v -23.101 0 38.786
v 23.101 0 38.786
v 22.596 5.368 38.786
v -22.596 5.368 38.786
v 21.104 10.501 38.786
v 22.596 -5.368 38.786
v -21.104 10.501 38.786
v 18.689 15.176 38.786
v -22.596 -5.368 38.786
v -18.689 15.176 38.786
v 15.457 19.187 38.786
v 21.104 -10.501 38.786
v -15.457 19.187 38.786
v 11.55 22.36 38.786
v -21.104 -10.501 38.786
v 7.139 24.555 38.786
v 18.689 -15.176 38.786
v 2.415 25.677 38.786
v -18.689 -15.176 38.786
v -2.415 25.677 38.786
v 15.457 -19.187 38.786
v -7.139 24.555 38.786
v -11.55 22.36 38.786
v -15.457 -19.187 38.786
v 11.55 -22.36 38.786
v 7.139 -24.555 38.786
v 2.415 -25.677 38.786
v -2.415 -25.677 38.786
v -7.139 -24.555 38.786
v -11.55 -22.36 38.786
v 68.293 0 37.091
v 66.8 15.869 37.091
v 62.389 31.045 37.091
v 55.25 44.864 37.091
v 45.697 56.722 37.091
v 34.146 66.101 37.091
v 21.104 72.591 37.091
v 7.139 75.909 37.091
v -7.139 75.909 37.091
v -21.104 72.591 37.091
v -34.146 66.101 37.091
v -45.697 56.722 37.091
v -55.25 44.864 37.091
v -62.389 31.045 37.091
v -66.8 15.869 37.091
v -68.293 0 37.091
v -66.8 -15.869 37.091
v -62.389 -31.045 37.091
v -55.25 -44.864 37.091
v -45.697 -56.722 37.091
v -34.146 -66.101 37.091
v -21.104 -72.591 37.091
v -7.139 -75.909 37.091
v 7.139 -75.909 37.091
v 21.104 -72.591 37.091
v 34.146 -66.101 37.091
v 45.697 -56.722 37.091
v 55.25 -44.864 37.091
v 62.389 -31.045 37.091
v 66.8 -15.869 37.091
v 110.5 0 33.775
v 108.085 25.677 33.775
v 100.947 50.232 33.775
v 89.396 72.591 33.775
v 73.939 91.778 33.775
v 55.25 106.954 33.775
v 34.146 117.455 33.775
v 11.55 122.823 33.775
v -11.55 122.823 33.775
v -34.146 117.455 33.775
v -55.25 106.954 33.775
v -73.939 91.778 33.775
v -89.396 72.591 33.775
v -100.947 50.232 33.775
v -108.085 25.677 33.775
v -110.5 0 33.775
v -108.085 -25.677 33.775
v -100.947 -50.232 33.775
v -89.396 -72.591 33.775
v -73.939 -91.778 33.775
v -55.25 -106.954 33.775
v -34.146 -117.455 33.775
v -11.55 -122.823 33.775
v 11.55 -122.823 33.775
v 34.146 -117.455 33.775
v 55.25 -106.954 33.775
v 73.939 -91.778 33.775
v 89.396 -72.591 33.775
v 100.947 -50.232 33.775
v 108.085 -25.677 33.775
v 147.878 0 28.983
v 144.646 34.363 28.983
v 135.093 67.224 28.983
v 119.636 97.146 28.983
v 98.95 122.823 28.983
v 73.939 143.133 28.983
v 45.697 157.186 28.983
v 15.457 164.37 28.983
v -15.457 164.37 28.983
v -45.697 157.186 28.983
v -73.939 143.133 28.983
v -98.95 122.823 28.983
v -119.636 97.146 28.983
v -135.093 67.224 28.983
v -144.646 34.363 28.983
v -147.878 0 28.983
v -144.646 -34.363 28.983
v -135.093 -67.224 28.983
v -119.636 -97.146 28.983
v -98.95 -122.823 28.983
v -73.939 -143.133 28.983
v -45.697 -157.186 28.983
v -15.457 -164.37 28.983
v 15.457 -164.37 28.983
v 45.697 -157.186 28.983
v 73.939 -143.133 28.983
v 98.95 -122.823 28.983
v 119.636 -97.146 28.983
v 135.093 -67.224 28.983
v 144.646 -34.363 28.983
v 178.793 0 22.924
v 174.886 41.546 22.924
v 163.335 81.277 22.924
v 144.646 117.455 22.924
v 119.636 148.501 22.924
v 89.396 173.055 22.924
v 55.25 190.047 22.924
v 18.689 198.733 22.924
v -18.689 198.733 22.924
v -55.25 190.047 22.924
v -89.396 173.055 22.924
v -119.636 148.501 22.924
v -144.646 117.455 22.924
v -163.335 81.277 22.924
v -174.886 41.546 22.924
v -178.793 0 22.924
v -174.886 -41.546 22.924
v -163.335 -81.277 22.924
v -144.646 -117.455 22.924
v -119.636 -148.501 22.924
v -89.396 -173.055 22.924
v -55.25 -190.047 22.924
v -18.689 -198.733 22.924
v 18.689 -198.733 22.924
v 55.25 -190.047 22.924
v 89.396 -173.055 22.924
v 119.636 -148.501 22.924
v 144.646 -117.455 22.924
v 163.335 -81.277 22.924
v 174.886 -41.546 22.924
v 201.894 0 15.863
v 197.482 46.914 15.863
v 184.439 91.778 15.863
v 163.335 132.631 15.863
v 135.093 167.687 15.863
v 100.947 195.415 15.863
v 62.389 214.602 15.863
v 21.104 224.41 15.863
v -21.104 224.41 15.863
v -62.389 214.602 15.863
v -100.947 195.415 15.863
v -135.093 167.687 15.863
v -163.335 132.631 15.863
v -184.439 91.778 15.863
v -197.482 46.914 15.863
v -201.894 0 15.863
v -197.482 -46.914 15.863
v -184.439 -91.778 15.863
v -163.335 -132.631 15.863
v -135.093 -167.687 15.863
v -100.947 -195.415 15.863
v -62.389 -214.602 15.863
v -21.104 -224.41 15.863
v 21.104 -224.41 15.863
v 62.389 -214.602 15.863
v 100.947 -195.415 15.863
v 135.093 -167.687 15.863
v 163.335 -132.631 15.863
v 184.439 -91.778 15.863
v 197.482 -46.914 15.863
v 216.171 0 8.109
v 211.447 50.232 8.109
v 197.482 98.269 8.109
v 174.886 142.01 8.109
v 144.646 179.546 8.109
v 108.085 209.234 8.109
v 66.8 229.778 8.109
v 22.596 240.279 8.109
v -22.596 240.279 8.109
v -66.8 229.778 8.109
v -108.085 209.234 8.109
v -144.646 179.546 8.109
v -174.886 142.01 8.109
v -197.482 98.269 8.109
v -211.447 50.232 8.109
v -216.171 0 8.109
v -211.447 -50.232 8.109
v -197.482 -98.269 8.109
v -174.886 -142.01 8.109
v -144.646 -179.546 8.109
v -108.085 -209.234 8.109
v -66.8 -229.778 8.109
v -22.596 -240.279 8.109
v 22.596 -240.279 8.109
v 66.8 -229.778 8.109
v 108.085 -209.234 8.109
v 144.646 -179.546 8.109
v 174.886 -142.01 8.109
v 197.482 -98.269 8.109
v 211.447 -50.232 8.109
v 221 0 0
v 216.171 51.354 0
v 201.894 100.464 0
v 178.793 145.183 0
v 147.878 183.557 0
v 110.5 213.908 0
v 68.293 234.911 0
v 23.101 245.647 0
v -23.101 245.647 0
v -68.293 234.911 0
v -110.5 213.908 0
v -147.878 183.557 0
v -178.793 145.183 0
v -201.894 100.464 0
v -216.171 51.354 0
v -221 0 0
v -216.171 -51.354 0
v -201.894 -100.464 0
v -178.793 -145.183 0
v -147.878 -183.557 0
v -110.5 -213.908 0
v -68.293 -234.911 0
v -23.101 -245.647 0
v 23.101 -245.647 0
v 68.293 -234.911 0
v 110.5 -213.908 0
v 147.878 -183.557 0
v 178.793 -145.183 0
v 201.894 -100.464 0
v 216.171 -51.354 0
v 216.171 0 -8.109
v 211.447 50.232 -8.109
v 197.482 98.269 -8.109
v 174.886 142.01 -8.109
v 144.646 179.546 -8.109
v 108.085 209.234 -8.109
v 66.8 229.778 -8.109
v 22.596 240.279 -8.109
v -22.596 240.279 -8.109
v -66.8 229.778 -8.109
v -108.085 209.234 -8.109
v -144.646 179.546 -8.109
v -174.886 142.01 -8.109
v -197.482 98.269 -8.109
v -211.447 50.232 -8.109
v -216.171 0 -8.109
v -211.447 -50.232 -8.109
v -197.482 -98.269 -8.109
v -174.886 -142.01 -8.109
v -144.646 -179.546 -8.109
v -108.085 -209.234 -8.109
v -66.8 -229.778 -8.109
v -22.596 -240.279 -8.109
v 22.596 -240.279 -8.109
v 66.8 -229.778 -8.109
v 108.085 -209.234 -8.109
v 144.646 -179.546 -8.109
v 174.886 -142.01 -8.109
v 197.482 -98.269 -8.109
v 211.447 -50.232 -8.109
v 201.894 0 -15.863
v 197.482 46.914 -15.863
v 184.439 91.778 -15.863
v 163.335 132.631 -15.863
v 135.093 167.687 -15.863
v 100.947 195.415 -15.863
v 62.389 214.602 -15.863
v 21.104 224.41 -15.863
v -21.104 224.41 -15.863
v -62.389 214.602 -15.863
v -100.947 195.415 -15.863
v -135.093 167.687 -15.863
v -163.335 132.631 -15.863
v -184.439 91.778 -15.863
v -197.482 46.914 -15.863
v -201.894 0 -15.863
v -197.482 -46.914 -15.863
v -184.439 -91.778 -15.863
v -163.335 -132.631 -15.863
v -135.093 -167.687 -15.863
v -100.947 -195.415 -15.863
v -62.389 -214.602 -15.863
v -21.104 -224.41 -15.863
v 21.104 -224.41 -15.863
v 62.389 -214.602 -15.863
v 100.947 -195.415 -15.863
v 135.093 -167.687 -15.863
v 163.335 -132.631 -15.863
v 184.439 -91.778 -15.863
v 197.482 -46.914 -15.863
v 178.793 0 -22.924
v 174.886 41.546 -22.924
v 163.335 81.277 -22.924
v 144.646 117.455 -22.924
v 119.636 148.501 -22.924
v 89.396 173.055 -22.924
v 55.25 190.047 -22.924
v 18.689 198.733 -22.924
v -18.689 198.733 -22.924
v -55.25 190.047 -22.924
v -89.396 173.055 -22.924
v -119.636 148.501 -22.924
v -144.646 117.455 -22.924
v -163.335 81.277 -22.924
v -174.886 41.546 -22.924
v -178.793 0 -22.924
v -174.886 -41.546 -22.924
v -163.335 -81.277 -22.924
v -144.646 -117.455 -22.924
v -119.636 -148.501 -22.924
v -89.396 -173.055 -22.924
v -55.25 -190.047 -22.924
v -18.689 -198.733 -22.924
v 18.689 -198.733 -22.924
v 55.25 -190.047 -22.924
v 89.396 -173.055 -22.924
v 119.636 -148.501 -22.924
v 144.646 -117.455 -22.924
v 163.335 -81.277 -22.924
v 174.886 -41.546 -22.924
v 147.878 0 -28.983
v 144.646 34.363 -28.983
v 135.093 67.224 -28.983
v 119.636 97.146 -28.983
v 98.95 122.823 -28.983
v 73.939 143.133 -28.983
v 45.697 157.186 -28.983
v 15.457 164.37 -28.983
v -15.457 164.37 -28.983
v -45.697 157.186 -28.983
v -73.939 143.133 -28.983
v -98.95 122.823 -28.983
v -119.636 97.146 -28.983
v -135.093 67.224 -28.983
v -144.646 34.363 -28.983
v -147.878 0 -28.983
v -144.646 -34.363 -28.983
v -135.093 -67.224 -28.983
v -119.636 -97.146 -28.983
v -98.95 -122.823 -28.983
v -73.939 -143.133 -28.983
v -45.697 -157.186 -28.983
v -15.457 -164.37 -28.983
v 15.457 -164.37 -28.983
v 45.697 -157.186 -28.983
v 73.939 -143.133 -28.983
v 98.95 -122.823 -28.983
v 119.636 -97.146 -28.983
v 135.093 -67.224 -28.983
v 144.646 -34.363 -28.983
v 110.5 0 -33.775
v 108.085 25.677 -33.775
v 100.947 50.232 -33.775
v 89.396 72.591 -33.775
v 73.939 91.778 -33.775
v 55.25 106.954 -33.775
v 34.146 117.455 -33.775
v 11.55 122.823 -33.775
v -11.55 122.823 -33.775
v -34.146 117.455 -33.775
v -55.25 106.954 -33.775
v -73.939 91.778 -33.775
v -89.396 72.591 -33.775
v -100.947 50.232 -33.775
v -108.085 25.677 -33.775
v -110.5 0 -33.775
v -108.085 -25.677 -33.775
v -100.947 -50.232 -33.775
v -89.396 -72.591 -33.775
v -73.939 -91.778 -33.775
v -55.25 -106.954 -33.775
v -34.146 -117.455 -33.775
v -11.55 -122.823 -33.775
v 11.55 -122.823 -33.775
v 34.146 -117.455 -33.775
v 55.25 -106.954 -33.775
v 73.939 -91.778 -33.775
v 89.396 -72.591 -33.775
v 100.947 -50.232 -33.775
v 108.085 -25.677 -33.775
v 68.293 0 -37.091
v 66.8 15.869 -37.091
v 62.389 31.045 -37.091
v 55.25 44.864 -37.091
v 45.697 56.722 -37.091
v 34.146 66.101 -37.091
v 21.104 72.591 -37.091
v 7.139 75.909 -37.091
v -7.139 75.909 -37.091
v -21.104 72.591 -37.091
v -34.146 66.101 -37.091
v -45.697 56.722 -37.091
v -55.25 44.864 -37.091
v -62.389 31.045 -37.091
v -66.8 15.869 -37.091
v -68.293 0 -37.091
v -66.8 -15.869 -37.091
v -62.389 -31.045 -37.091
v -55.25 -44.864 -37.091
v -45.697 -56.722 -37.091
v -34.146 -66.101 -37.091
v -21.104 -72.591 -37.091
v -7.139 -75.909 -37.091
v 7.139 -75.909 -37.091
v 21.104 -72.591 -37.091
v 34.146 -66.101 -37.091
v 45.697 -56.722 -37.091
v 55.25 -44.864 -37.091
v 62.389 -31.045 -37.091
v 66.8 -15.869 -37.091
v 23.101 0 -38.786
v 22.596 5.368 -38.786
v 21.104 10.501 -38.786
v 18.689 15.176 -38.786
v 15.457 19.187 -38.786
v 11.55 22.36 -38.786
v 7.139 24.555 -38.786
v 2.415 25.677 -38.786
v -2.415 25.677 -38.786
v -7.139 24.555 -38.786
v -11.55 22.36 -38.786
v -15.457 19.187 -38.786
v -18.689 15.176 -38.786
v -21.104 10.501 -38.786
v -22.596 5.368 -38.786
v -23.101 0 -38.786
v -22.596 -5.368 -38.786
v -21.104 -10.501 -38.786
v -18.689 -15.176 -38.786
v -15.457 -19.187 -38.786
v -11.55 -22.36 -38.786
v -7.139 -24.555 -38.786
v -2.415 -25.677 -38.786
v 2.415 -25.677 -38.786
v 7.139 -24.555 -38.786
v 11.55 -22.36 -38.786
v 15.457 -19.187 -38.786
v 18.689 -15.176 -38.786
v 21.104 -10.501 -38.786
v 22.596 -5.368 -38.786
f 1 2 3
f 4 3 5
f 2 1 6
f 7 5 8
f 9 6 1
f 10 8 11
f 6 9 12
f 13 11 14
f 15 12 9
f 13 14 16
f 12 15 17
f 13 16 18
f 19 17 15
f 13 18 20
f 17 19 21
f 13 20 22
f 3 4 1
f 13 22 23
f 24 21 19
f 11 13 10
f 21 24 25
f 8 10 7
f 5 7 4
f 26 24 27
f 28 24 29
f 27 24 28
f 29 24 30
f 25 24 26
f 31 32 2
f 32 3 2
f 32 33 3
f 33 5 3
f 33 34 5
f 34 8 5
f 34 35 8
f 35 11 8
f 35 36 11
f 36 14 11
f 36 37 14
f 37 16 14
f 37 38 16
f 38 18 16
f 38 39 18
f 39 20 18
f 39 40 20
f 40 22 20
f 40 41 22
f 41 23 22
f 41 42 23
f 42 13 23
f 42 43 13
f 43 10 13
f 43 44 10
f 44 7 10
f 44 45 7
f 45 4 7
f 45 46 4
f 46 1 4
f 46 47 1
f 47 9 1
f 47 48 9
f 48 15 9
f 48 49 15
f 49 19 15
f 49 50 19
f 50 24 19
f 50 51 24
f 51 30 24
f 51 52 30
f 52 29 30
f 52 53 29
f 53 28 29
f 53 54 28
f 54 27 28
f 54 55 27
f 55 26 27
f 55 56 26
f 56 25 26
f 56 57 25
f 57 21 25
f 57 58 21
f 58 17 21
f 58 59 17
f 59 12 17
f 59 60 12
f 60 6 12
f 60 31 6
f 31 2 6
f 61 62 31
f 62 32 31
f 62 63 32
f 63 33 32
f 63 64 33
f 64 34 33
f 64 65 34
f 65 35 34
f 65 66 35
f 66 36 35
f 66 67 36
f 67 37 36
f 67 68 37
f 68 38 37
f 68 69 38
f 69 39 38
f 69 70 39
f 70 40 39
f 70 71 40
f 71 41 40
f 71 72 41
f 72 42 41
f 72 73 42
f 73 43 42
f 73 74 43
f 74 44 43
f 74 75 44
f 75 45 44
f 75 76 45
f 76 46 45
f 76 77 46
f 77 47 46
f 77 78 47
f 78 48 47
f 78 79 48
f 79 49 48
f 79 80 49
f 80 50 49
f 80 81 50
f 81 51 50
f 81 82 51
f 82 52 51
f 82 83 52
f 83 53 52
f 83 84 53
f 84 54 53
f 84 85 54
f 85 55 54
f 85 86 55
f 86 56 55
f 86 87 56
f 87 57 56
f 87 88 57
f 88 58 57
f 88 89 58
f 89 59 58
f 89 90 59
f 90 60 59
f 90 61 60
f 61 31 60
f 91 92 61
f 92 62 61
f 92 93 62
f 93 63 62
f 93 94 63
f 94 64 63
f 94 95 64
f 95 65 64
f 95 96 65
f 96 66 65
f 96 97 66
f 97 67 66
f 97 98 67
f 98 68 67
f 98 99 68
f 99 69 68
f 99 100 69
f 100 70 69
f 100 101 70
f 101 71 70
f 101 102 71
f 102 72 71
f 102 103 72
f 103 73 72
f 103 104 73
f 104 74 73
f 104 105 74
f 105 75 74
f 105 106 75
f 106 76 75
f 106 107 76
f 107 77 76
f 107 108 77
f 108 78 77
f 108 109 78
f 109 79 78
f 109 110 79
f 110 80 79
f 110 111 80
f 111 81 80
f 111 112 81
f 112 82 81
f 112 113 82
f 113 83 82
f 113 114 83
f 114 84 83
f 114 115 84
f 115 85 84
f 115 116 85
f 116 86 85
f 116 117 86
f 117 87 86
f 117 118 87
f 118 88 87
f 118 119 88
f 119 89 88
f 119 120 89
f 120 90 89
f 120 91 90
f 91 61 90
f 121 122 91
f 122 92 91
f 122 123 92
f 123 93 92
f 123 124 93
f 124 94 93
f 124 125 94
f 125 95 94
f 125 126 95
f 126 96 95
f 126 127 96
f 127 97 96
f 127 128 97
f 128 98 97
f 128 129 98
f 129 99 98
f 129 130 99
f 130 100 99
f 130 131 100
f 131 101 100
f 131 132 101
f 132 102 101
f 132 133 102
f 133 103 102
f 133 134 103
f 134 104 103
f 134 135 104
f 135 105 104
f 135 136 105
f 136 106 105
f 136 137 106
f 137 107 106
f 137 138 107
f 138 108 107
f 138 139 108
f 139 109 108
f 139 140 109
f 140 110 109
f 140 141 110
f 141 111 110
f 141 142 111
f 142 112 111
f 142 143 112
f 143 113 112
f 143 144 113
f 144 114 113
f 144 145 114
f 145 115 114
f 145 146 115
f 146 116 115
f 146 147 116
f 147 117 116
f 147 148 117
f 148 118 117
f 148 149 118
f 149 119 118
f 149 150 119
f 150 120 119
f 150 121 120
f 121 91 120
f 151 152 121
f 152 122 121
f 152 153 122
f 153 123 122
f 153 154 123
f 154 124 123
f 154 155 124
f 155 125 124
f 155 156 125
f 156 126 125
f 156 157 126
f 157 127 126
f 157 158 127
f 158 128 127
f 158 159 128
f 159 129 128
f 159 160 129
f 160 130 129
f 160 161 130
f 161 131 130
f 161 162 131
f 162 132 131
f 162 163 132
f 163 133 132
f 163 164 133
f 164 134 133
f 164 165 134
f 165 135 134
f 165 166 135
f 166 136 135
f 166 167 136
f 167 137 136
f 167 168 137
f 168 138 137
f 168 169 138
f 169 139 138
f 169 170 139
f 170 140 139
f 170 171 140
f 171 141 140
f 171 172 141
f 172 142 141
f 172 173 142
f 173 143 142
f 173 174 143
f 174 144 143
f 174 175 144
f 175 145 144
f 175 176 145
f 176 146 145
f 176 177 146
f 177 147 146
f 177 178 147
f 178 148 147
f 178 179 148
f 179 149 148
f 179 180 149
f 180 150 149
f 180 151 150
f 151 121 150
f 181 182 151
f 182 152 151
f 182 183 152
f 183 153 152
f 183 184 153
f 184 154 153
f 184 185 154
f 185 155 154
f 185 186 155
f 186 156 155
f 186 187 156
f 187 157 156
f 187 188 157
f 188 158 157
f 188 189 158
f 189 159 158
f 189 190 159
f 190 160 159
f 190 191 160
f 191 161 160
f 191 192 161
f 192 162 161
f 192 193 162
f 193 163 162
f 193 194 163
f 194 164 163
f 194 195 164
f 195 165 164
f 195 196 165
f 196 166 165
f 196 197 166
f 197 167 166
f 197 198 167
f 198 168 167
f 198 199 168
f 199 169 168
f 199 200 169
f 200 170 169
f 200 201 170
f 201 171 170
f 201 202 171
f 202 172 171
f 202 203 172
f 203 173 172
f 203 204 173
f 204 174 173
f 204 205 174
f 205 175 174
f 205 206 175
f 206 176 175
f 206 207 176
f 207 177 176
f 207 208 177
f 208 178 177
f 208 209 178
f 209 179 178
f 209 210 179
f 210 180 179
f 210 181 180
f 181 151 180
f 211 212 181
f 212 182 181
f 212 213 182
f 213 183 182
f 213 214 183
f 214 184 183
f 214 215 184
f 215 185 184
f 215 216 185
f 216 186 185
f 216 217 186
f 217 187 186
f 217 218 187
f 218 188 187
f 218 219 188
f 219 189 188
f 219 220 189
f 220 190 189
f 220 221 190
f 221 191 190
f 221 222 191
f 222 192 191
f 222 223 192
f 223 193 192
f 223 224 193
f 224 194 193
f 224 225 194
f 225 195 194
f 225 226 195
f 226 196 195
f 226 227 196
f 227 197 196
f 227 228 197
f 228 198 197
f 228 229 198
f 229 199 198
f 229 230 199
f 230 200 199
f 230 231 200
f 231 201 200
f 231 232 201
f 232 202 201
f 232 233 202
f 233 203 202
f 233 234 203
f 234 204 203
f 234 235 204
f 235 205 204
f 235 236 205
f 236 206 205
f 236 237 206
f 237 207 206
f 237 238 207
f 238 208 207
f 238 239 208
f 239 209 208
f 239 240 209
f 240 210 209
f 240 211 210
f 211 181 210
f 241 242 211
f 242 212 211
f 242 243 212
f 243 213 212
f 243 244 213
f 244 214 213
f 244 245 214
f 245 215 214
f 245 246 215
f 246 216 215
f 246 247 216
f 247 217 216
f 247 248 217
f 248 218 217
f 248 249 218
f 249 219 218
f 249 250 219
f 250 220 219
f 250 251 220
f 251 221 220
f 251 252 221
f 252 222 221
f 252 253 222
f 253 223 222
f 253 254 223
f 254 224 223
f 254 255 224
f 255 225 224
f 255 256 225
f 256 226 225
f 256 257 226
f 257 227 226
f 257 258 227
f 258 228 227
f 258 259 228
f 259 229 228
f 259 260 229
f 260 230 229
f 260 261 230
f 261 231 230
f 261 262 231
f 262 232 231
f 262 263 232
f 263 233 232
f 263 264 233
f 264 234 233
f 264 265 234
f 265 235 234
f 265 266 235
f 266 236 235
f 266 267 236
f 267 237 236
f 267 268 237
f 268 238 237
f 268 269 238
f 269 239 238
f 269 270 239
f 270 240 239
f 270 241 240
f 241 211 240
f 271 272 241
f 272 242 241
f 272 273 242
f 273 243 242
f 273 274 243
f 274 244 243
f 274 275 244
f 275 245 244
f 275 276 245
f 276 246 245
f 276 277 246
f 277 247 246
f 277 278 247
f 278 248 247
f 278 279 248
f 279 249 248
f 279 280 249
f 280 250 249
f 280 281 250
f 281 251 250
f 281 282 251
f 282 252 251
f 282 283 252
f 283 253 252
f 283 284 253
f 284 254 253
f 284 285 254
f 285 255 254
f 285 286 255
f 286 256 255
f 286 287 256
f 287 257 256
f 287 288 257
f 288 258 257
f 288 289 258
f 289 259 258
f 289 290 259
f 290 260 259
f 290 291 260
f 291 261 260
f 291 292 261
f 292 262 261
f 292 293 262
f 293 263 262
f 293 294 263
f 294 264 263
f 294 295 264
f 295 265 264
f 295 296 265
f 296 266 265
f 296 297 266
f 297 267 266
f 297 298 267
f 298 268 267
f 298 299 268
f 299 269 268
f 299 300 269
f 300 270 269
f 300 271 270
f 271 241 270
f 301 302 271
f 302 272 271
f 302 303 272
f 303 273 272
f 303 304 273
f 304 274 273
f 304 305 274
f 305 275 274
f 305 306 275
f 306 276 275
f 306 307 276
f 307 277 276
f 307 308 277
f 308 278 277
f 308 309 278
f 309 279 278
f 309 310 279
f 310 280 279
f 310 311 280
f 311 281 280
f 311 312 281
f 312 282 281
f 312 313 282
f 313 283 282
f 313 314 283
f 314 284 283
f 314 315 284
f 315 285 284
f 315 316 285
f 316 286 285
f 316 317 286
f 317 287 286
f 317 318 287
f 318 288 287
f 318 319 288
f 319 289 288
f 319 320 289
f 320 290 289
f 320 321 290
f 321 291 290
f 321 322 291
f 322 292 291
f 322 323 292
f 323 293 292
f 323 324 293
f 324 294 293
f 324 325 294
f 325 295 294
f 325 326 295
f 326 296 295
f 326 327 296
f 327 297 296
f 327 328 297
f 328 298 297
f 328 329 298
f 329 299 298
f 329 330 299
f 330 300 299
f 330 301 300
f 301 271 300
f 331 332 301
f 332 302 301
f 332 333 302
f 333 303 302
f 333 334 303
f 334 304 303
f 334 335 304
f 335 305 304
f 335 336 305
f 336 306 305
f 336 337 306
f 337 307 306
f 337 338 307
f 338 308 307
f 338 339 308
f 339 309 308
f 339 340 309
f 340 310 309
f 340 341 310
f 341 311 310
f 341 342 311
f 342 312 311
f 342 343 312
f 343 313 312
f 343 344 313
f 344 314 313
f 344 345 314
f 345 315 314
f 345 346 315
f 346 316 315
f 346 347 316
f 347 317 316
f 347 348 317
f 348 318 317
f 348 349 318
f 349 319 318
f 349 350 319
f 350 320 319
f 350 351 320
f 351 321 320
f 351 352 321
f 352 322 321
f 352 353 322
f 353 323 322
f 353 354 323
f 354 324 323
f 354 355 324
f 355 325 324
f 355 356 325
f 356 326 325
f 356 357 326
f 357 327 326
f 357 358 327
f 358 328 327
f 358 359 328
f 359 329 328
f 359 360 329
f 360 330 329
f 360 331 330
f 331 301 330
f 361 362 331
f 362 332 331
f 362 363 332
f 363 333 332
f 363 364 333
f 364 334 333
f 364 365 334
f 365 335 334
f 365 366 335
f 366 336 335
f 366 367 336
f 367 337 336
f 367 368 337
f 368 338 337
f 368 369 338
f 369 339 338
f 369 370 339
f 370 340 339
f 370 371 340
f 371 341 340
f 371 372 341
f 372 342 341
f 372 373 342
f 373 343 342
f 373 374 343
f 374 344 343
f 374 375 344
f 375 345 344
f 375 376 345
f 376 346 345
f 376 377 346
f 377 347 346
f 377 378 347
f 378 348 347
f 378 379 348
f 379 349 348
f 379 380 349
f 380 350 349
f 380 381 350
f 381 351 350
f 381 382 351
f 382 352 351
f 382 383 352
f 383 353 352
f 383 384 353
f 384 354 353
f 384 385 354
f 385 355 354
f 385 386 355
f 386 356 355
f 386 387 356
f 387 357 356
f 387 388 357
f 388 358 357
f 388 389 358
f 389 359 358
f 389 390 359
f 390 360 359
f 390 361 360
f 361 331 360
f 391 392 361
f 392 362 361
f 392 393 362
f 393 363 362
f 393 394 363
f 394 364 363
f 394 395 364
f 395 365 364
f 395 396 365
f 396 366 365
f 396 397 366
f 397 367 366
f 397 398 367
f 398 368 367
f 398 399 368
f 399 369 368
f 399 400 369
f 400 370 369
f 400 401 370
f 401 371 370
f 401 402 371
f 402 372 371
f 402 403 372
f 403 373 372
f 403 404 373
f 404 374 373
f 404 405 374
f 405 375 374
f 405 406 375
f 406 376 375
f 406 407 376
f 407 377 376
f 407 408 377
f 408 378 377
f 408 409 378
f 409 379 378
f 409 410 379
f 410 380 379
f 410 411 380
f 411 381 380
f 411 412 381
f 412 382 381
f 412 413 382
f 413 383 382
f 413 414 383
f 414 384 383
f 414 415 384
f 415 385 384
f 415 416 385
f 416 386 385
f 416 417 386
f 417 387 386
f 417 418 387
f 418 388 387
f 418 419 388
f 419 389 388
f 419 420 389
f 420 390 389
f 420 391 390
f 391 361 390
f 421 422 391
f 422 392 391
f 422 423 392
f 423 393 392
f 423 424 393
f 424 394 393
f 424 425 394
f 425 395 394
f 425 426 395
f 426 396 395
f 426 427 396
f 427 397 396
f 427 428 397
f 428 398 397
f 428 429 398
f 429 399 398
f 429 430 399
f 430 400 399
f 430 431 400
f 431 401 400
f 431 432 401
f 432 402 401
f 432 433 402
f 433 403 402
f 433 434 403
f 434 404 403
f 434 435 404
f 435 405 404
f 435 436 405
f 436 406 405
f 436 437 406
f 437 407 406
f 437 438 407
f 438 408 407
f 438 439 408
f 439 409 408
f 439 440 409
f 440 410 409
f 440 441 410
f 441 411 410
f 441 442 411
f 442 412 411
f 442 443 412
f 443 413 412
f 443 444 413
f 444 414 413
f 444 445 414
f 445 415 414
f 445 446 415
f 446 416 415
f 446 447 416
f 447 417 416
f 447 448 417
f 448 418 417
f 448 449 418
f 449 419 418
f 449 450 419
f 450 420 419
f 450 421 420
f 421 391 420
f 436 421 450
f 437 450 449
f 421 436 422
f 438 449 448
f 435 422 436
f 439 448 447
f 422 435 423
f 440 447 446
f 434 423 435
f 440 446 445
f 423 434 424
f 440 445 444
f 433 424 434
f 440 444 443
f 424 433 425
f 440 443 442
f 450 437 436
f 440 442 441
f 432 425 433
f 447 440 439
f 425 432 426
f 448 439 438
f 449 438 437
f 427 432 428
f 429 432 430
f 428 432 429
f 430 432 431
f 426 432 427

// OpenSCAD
// Generated by SolidPython 1.0.1 on 2020-07-29 00:46:53


scale(v = [17, 19, 3]) {
	sphere(r = 13);
}
/***********************************************
*********      SolidPython code:      **********
************************************************
 
# import packages: SolidPython
from solid import *
from solid.utils import *
from itertools import chain, combinations, permutations


class Resize:

    def __init__(self, scad_file):
        self.scad_file = scad_file
        #self.scad_file = import_scad(scad_file)
        # cone/cylinder param:
        self.r1 = 0
        self.r2 = 0
        self.h = 0
        # rectangular prism param:
        self.w = 0
        self.l = 0
        # ellipse param:
        self.r = 0

    # import OpenScad code (file name corresponds to shape)


    # classify shape + parameters
    def assign(self, param1, param2, param3):
        if self.scad_file == 'cone.scad':
            self.r1 = param1
            self.r2 = param2
            self.h = param3
        elif self.scad_file == 'cylinder.scad':
            self.r1 = param1
            self.r2 = param2
            self.h = param3
        elif self.scad_file == 'rectangularPrism.scad':
            self.h = param1
            self.l = param2
            self.w = param3
        else:
            self.r = param1
            self.h = param2

    # resize parameters
    def iterate(self):
        x = range(3, 20, 2)
        i = 1
        if self.scad_file == 'cone.scad':
            tempList = list(permutations(x, 2))
            for temp in tempList:
                param1 = temp[0]
                param2 = temp[1]
                filepath = 'produced_scad_files/' + 'cone' + str(param1) + '_' + str(param2) + '_' + '.scad'
                scad_render_to_file(cylinder(h=param1, r1=param2, r2=0), filepath)

        elif self.scad_file == 'cylinder.scad':
            tempList = list(permutations(x, 3))
            for temp in tempList:
                param1 = temp[0]
                param2 = temp[1]
                filepath = 'produced_scad_files/' + 'cylinder' + str(param1) + '_' + str(param2) + '_' + '.scad'
                scad_render_to_file(cylinder(h=param1, r1=param2, r2=param2), filepath)

        elif self.scad_file == 'rectangularPrism.scad':
            tempList = list(permutations(x, 3))
            for temp in tempList:
                param1 = temp[0]
                param2 = temp[1]
                param3 = temp[2]
                filepath = 'produced_scad_files/' + 'rectangularPrism' + str(param1) + '_' + str(param2) + '_' + str(
                    param3) + '.scad'
                scad_render_to_file(cube(size=(param1, param2, param3)), filepath)

        elif self.scad_file == 'ellipse.scad':
            tempList = list(permutations(x, 4))
            for temp in tempList:
                param1 = temp[0]
                param2 = temp[1]
                param3 = temp[2]
                param4 = temp[3]
                filepath = 'produced_scad_files/' + 'ellipse' + str(param1) + '_' + str(param2) + '_' + str(param3) + '_' + str(param4) + '.scad'
                scad_render_to_file(scale([param1, param2, param3])(sphere(r=param4)), filepath)

    def render_to_scadfile(self):
        scad_render_to_file(scad, 'example.scad') 
 
************************************************/
